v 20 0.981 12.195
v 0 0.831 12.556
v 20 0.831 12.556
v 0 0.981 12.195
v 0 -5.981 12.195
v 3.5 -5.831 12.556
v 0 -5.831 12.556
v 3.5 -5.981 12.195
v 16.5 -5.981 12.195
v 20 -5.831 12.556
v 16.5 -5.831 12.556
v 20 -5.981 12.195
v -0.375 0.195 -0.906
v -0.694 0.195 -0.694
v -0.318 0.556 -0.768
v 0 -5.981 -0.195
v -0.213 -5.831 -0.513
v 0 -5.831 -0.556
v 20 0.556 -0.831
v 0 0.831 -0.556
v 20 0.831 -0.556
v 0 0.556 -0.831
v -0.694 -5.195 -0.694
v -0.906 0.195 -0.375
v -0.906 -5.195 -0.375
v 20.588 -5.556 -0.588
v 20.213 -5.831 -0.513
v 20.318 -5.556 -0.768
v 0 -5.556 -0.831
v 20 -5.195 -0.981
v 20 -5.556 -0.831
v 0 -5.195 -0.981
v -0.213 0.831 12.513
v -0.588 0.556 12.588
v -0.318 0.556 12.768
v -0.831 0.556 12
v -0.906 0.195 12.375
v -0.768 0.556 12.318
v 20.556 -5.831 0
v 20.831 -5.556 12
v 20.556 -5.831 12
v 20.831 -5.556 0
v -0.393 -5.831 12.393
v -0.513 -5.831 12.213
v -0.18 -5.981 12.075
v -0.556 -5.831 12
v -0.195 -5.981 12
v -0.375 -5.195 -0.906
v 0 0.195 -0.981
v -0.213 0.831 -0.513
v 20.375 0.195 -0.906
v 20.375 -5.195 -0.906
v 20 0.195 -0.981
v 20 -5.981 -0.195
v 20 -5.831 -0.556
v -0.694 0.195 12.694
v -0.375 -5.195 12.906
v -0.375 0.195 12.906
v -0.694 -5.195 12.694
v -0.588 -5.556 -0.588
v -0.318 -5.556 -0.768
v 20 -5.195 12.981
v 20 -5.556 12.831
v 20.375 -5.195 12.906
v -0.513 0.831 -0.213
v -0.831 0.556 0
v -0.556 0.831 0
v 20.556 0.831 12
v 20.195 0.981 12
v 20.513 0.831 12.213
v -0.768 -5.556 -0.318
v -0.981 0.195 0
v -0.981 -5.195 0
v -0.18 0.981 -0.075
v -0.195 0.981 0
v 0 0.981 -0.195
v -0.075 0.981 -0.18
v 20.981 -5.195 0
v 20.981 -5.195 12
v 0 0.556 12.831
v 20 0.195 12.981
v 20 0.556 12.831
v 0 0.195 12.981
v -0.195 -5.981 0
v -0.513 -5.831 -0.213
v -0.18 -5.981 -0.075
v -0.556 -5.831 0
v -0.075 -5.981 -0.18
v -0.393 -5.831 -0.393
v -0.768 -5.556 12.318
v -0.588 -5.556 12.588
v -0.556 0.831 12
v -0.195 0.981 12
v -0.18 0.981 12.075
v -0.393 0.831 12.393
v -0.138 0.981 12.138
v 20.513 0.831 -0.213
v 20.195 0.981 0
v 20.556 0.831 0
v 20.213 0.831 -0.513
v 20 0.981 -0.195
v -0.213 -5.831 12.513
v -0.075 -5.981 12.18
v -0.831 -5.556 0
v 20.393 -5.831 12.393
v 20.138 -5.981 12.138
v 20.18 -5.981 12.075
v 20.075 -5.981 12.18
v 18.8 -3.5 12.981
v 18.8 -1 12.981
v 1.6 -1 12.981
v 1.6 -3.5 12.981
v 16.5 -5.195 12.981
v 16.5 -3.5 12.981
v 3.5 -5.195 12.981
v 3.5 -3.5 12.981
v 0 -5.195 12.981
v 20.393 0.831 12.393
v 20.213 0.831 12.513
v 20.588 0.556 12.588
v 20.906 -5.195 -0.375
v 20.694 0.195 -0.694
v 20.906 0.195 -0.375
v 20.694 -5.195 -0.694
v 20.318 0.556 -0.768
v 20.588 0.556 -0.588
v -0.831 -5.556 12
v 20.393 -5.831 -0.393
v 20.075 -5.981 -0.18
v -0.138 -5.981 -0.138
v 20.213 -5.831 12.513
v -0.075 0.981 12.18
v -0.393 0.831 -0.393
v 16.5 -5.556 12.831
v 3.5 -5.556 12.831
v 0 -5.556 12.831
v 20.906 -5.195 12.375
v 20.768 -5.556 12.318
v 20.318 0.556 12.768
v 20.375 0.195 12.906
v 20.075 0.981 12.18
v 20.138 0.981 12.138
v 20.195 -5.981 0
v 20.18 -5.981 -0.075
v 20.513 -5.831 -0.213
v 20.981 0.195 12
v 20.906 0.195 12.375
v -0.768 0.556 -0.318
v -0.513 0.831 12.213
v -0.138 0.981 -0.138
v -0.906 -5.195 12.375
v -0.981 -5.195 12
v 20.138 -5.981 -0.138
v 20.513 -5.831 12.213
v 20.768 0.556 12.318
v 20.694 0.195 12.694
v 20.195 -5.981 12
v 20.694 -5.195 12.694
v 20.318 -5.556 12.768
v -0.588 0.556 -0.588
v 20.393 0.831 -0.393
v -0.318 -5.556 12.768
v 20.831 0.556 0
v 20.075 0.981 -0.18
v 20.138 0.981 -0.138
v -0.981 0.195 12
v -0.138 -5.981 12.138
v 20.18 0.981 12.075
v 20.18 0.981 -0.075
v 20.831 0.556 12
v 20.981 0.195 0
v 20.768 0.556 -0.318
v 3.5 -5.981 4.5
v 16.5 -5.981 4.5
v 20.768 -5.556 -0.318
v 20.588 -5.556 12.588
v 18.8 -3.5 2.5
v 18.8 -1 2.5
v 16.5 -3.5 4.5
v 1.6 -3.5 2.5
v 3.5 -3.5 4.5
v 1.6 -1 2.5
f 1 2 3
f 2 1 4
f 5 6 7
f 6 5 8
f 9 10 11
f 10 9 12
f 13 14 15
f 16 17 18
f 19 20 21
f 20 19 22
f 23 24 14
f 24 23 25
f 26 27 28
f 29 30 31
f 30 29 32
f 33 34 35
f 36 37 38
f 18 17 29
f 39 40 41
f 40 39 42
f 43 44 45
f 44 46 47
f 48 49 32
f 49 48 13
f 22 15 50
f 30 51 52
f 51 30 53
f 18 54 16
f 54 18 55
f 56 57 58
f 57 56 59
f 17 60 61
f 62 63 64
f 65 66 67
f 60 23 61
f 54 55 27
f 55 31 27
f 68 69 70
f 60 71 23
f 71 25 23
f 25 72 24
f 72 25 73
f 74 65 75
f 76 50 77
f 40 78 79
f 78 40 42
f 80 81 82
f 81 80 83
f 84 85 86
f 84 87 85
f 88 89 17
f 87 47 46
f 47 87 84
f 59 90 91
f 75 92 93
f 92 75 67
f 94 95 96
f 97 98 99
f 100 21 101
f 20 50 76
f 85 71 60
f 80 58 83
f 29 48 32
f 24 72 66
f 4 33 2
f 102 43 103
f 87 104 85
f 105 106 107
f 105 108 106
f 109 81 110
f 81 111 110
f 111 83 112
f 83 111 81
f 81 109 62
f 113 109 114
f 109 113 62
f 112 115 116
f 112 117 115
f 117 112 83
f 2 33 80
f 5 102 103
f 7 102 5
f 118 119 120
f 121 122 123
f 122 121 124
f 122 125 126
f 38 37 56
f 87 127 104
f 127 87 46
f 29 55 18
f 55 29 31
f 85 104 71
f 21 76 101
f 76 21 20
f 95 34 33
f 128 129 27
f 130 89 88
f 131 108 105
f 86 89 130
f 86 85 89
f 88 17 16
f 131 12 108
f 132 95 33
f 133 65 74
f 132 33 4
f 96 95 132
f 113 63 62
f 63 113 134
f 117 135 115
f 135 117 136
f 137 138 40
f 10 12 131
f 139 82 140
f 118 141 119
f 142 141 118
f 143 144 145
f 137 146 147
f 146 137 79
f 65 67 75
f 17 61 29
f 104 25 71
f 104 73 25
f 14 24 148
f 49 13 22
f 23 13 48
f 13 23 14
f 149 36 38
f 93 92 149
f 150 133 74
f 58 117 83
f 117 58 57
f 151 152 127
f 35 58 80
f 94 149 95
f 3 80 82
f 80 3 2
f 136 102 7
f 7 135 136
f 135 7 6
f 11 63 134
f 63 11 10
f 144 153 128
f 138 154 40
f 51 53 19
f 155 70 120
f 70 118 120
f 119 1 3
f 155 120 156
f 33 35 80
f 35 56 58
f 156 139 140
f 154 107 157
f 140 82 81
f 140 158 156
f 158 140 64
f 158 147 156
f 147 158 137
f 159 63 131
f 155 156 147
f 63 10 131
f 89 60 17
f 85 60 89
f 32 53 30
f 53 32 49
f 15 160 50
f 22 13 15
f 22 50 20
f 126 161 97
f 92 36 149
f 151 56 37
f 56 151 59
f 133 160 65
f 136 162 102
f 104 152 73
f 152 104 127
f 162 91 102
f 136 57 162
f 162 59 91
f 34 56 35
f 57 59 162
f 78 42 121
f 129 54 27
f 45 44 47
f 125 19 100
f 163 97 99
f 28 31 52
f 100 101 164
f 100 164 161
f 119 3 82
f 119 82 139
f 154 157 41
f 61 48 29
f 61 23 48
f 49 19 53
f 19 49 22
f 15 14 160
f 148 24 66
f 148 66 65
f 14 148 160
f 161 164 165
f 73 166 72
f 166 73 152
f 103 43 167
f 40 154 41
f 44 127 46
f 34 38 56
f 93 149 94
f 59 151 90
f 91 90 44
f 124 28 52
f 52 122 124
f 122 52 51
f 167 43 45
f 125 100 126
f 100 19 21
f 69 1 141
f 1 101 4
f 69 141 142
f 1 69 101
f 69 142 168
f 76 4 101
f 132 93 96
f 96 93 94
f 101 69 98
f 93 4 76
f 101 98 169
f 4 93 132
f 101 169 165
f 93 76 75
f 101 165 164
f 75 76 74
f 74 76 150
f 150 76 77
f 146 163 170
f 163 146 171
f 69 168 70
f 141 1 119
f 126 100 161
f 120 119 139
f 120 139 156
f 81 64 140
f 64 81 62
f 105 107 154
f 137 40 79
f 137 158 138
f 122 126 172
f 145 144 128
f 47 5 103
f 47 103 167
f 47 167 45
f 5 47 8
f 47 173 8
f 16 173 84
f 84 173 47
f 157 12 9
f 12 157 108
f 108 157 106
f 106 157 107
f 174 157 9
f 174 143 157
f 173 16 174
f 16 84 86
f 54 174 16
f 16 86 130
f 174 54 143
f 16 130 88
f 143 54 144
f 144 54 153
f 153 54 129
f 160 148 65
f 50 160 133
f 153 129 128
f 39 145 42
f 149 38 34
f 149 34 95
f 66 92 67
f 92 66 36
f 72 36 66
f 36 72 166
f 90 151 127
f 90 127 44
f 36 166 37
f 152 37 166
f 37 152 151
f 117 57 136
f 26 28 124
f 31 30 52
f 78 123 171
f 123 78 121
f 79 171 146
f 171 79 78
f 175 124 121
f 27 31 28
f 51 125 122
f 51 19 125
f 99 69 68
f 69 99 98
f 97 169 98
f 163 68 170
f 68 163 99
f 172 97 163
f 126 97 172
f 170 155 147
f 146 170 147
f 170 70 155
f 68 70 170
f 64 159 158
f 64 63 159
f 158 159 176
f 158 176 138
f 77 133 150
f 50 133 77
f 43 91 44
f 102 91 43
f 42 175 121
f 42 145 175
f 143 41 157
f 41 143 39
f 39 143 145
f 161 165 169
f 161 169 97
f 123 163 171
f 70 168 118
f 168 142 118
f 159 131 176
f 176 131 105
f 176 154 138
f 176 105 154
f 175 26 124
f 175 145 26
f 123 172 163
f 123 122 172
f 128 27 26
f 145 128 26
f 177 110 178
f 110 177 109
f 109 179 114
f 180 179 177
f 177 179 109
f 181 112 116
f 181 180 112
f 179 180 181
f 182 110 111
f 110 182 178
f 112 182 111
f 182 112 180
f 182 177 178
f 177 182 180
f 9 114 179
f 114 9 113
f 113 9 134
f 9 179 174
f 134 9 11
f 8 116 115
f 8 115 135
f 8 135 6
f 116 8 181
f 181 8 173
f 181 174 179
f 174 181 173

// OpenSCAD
module holder_wall() {
    difference() {
        minkowski() {
 
            cube([20, 12, 5]);
            sphere(r=1, $fn=16);
        }

        translate([1.6,2.5,1])
        cube([17.2, 25, 2.5]);
        
        translate([3.5,4.5,3])
        cube([13, 20, 3]);
    }
}

rotate([90,0,0])
holder_wall();
